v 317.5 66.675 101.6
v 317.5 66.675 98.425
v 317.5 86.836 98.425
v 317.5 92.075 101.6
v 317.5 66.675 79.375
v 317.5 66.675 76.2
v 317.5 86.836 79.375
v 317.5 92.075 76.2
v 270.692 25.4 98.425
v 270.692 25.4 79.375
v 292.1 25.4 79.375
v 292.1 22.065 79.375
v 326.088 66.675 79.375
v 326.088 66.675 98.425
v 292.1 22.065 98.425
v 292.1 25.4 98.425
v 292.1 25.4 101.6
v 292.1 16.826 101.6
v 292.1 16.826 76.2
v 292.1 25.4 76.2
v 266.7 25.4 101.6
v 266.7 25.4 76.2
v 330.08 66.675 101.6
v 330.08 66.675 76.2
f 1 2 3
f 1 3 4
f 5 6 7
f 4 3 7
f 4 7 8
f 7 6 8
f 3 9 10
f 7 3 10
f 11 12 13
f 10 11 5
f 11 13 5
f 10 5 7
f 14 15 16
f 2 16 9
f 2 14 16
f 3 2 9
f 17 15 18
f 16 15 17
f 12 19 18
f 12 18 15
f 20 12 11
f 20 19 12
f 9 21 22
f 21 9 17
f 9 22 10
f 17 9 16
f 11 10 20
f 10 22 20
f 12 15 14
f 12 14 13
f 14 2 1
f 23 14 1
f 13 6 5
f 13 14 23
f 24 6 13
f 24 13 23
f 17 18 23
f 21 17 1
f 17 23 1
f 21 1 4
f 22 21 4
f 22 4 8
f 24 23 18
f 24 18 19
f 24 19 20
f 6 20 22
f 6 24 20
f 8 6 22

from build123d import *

# Parameters (mm, degrees)
BOSS_EXTRUDE1_DEPTH      = 8.573703
BOSS_EXTRUDE1_DEPTH_BACK = 75.248703
SKETCH1_W                = 25.4
SKETCH1_H                = 25.4
SKETCH1_W_2              = 19.05
SKETCH1_H_2              = 19.05
SKETCH2_W                = 25.4
SKETCH2_H                = 25.4
SKETCH2_H_2              = 50.8
CUT_EXTRUDE1_DEPTH       = 365.478167069


with BuildPart() as part:
    # Sketch1 → Boss-Extrude1 (new, two sides: drawn at the far end of the back side and taken through both)
    with BuildSketch(Plane(origin=(115.396321255, 151.457671647, 0), x_dir=(-0.7954317200324988, 0.606043215262856, 0), z_dir=(-0.606043215262856, -0.7954317200324988, 0)).offset(-BOSS_EXTRUDE1_DEPTH_BACK)):
        with Locations((-209.448142065, -88.9)):
            Rectangle(SKETCH1_W, SKETCH1_H)
        with Locations((-209.448142065, -88.9)):
            Rectangle(SKETCH1_W_2, SKETCH1_H_2, mode=Mode.SUBTRACT)
    extrude(amount=BOSS_EXTRUDE1_DEPTH + BOSS_EXTRUDE1_DEPTH_BACK)

    # Sketch2 → Cut-Extrude1 (cut, through all)
    with BuildSketch(Plane.XY):
        with Locations((330.2, 79.375)):
            Rectangle(SKETCH2_W, SKETCH2_H)
        with Locations((279.4, 0)):
            Rectangle(SKETCH2_W, SKETCH2_H_2)
    extrude(amount=CUT_EXTRUDE1_DEPTH, mode=Mode.SUBTRACT)


solid = part.part
